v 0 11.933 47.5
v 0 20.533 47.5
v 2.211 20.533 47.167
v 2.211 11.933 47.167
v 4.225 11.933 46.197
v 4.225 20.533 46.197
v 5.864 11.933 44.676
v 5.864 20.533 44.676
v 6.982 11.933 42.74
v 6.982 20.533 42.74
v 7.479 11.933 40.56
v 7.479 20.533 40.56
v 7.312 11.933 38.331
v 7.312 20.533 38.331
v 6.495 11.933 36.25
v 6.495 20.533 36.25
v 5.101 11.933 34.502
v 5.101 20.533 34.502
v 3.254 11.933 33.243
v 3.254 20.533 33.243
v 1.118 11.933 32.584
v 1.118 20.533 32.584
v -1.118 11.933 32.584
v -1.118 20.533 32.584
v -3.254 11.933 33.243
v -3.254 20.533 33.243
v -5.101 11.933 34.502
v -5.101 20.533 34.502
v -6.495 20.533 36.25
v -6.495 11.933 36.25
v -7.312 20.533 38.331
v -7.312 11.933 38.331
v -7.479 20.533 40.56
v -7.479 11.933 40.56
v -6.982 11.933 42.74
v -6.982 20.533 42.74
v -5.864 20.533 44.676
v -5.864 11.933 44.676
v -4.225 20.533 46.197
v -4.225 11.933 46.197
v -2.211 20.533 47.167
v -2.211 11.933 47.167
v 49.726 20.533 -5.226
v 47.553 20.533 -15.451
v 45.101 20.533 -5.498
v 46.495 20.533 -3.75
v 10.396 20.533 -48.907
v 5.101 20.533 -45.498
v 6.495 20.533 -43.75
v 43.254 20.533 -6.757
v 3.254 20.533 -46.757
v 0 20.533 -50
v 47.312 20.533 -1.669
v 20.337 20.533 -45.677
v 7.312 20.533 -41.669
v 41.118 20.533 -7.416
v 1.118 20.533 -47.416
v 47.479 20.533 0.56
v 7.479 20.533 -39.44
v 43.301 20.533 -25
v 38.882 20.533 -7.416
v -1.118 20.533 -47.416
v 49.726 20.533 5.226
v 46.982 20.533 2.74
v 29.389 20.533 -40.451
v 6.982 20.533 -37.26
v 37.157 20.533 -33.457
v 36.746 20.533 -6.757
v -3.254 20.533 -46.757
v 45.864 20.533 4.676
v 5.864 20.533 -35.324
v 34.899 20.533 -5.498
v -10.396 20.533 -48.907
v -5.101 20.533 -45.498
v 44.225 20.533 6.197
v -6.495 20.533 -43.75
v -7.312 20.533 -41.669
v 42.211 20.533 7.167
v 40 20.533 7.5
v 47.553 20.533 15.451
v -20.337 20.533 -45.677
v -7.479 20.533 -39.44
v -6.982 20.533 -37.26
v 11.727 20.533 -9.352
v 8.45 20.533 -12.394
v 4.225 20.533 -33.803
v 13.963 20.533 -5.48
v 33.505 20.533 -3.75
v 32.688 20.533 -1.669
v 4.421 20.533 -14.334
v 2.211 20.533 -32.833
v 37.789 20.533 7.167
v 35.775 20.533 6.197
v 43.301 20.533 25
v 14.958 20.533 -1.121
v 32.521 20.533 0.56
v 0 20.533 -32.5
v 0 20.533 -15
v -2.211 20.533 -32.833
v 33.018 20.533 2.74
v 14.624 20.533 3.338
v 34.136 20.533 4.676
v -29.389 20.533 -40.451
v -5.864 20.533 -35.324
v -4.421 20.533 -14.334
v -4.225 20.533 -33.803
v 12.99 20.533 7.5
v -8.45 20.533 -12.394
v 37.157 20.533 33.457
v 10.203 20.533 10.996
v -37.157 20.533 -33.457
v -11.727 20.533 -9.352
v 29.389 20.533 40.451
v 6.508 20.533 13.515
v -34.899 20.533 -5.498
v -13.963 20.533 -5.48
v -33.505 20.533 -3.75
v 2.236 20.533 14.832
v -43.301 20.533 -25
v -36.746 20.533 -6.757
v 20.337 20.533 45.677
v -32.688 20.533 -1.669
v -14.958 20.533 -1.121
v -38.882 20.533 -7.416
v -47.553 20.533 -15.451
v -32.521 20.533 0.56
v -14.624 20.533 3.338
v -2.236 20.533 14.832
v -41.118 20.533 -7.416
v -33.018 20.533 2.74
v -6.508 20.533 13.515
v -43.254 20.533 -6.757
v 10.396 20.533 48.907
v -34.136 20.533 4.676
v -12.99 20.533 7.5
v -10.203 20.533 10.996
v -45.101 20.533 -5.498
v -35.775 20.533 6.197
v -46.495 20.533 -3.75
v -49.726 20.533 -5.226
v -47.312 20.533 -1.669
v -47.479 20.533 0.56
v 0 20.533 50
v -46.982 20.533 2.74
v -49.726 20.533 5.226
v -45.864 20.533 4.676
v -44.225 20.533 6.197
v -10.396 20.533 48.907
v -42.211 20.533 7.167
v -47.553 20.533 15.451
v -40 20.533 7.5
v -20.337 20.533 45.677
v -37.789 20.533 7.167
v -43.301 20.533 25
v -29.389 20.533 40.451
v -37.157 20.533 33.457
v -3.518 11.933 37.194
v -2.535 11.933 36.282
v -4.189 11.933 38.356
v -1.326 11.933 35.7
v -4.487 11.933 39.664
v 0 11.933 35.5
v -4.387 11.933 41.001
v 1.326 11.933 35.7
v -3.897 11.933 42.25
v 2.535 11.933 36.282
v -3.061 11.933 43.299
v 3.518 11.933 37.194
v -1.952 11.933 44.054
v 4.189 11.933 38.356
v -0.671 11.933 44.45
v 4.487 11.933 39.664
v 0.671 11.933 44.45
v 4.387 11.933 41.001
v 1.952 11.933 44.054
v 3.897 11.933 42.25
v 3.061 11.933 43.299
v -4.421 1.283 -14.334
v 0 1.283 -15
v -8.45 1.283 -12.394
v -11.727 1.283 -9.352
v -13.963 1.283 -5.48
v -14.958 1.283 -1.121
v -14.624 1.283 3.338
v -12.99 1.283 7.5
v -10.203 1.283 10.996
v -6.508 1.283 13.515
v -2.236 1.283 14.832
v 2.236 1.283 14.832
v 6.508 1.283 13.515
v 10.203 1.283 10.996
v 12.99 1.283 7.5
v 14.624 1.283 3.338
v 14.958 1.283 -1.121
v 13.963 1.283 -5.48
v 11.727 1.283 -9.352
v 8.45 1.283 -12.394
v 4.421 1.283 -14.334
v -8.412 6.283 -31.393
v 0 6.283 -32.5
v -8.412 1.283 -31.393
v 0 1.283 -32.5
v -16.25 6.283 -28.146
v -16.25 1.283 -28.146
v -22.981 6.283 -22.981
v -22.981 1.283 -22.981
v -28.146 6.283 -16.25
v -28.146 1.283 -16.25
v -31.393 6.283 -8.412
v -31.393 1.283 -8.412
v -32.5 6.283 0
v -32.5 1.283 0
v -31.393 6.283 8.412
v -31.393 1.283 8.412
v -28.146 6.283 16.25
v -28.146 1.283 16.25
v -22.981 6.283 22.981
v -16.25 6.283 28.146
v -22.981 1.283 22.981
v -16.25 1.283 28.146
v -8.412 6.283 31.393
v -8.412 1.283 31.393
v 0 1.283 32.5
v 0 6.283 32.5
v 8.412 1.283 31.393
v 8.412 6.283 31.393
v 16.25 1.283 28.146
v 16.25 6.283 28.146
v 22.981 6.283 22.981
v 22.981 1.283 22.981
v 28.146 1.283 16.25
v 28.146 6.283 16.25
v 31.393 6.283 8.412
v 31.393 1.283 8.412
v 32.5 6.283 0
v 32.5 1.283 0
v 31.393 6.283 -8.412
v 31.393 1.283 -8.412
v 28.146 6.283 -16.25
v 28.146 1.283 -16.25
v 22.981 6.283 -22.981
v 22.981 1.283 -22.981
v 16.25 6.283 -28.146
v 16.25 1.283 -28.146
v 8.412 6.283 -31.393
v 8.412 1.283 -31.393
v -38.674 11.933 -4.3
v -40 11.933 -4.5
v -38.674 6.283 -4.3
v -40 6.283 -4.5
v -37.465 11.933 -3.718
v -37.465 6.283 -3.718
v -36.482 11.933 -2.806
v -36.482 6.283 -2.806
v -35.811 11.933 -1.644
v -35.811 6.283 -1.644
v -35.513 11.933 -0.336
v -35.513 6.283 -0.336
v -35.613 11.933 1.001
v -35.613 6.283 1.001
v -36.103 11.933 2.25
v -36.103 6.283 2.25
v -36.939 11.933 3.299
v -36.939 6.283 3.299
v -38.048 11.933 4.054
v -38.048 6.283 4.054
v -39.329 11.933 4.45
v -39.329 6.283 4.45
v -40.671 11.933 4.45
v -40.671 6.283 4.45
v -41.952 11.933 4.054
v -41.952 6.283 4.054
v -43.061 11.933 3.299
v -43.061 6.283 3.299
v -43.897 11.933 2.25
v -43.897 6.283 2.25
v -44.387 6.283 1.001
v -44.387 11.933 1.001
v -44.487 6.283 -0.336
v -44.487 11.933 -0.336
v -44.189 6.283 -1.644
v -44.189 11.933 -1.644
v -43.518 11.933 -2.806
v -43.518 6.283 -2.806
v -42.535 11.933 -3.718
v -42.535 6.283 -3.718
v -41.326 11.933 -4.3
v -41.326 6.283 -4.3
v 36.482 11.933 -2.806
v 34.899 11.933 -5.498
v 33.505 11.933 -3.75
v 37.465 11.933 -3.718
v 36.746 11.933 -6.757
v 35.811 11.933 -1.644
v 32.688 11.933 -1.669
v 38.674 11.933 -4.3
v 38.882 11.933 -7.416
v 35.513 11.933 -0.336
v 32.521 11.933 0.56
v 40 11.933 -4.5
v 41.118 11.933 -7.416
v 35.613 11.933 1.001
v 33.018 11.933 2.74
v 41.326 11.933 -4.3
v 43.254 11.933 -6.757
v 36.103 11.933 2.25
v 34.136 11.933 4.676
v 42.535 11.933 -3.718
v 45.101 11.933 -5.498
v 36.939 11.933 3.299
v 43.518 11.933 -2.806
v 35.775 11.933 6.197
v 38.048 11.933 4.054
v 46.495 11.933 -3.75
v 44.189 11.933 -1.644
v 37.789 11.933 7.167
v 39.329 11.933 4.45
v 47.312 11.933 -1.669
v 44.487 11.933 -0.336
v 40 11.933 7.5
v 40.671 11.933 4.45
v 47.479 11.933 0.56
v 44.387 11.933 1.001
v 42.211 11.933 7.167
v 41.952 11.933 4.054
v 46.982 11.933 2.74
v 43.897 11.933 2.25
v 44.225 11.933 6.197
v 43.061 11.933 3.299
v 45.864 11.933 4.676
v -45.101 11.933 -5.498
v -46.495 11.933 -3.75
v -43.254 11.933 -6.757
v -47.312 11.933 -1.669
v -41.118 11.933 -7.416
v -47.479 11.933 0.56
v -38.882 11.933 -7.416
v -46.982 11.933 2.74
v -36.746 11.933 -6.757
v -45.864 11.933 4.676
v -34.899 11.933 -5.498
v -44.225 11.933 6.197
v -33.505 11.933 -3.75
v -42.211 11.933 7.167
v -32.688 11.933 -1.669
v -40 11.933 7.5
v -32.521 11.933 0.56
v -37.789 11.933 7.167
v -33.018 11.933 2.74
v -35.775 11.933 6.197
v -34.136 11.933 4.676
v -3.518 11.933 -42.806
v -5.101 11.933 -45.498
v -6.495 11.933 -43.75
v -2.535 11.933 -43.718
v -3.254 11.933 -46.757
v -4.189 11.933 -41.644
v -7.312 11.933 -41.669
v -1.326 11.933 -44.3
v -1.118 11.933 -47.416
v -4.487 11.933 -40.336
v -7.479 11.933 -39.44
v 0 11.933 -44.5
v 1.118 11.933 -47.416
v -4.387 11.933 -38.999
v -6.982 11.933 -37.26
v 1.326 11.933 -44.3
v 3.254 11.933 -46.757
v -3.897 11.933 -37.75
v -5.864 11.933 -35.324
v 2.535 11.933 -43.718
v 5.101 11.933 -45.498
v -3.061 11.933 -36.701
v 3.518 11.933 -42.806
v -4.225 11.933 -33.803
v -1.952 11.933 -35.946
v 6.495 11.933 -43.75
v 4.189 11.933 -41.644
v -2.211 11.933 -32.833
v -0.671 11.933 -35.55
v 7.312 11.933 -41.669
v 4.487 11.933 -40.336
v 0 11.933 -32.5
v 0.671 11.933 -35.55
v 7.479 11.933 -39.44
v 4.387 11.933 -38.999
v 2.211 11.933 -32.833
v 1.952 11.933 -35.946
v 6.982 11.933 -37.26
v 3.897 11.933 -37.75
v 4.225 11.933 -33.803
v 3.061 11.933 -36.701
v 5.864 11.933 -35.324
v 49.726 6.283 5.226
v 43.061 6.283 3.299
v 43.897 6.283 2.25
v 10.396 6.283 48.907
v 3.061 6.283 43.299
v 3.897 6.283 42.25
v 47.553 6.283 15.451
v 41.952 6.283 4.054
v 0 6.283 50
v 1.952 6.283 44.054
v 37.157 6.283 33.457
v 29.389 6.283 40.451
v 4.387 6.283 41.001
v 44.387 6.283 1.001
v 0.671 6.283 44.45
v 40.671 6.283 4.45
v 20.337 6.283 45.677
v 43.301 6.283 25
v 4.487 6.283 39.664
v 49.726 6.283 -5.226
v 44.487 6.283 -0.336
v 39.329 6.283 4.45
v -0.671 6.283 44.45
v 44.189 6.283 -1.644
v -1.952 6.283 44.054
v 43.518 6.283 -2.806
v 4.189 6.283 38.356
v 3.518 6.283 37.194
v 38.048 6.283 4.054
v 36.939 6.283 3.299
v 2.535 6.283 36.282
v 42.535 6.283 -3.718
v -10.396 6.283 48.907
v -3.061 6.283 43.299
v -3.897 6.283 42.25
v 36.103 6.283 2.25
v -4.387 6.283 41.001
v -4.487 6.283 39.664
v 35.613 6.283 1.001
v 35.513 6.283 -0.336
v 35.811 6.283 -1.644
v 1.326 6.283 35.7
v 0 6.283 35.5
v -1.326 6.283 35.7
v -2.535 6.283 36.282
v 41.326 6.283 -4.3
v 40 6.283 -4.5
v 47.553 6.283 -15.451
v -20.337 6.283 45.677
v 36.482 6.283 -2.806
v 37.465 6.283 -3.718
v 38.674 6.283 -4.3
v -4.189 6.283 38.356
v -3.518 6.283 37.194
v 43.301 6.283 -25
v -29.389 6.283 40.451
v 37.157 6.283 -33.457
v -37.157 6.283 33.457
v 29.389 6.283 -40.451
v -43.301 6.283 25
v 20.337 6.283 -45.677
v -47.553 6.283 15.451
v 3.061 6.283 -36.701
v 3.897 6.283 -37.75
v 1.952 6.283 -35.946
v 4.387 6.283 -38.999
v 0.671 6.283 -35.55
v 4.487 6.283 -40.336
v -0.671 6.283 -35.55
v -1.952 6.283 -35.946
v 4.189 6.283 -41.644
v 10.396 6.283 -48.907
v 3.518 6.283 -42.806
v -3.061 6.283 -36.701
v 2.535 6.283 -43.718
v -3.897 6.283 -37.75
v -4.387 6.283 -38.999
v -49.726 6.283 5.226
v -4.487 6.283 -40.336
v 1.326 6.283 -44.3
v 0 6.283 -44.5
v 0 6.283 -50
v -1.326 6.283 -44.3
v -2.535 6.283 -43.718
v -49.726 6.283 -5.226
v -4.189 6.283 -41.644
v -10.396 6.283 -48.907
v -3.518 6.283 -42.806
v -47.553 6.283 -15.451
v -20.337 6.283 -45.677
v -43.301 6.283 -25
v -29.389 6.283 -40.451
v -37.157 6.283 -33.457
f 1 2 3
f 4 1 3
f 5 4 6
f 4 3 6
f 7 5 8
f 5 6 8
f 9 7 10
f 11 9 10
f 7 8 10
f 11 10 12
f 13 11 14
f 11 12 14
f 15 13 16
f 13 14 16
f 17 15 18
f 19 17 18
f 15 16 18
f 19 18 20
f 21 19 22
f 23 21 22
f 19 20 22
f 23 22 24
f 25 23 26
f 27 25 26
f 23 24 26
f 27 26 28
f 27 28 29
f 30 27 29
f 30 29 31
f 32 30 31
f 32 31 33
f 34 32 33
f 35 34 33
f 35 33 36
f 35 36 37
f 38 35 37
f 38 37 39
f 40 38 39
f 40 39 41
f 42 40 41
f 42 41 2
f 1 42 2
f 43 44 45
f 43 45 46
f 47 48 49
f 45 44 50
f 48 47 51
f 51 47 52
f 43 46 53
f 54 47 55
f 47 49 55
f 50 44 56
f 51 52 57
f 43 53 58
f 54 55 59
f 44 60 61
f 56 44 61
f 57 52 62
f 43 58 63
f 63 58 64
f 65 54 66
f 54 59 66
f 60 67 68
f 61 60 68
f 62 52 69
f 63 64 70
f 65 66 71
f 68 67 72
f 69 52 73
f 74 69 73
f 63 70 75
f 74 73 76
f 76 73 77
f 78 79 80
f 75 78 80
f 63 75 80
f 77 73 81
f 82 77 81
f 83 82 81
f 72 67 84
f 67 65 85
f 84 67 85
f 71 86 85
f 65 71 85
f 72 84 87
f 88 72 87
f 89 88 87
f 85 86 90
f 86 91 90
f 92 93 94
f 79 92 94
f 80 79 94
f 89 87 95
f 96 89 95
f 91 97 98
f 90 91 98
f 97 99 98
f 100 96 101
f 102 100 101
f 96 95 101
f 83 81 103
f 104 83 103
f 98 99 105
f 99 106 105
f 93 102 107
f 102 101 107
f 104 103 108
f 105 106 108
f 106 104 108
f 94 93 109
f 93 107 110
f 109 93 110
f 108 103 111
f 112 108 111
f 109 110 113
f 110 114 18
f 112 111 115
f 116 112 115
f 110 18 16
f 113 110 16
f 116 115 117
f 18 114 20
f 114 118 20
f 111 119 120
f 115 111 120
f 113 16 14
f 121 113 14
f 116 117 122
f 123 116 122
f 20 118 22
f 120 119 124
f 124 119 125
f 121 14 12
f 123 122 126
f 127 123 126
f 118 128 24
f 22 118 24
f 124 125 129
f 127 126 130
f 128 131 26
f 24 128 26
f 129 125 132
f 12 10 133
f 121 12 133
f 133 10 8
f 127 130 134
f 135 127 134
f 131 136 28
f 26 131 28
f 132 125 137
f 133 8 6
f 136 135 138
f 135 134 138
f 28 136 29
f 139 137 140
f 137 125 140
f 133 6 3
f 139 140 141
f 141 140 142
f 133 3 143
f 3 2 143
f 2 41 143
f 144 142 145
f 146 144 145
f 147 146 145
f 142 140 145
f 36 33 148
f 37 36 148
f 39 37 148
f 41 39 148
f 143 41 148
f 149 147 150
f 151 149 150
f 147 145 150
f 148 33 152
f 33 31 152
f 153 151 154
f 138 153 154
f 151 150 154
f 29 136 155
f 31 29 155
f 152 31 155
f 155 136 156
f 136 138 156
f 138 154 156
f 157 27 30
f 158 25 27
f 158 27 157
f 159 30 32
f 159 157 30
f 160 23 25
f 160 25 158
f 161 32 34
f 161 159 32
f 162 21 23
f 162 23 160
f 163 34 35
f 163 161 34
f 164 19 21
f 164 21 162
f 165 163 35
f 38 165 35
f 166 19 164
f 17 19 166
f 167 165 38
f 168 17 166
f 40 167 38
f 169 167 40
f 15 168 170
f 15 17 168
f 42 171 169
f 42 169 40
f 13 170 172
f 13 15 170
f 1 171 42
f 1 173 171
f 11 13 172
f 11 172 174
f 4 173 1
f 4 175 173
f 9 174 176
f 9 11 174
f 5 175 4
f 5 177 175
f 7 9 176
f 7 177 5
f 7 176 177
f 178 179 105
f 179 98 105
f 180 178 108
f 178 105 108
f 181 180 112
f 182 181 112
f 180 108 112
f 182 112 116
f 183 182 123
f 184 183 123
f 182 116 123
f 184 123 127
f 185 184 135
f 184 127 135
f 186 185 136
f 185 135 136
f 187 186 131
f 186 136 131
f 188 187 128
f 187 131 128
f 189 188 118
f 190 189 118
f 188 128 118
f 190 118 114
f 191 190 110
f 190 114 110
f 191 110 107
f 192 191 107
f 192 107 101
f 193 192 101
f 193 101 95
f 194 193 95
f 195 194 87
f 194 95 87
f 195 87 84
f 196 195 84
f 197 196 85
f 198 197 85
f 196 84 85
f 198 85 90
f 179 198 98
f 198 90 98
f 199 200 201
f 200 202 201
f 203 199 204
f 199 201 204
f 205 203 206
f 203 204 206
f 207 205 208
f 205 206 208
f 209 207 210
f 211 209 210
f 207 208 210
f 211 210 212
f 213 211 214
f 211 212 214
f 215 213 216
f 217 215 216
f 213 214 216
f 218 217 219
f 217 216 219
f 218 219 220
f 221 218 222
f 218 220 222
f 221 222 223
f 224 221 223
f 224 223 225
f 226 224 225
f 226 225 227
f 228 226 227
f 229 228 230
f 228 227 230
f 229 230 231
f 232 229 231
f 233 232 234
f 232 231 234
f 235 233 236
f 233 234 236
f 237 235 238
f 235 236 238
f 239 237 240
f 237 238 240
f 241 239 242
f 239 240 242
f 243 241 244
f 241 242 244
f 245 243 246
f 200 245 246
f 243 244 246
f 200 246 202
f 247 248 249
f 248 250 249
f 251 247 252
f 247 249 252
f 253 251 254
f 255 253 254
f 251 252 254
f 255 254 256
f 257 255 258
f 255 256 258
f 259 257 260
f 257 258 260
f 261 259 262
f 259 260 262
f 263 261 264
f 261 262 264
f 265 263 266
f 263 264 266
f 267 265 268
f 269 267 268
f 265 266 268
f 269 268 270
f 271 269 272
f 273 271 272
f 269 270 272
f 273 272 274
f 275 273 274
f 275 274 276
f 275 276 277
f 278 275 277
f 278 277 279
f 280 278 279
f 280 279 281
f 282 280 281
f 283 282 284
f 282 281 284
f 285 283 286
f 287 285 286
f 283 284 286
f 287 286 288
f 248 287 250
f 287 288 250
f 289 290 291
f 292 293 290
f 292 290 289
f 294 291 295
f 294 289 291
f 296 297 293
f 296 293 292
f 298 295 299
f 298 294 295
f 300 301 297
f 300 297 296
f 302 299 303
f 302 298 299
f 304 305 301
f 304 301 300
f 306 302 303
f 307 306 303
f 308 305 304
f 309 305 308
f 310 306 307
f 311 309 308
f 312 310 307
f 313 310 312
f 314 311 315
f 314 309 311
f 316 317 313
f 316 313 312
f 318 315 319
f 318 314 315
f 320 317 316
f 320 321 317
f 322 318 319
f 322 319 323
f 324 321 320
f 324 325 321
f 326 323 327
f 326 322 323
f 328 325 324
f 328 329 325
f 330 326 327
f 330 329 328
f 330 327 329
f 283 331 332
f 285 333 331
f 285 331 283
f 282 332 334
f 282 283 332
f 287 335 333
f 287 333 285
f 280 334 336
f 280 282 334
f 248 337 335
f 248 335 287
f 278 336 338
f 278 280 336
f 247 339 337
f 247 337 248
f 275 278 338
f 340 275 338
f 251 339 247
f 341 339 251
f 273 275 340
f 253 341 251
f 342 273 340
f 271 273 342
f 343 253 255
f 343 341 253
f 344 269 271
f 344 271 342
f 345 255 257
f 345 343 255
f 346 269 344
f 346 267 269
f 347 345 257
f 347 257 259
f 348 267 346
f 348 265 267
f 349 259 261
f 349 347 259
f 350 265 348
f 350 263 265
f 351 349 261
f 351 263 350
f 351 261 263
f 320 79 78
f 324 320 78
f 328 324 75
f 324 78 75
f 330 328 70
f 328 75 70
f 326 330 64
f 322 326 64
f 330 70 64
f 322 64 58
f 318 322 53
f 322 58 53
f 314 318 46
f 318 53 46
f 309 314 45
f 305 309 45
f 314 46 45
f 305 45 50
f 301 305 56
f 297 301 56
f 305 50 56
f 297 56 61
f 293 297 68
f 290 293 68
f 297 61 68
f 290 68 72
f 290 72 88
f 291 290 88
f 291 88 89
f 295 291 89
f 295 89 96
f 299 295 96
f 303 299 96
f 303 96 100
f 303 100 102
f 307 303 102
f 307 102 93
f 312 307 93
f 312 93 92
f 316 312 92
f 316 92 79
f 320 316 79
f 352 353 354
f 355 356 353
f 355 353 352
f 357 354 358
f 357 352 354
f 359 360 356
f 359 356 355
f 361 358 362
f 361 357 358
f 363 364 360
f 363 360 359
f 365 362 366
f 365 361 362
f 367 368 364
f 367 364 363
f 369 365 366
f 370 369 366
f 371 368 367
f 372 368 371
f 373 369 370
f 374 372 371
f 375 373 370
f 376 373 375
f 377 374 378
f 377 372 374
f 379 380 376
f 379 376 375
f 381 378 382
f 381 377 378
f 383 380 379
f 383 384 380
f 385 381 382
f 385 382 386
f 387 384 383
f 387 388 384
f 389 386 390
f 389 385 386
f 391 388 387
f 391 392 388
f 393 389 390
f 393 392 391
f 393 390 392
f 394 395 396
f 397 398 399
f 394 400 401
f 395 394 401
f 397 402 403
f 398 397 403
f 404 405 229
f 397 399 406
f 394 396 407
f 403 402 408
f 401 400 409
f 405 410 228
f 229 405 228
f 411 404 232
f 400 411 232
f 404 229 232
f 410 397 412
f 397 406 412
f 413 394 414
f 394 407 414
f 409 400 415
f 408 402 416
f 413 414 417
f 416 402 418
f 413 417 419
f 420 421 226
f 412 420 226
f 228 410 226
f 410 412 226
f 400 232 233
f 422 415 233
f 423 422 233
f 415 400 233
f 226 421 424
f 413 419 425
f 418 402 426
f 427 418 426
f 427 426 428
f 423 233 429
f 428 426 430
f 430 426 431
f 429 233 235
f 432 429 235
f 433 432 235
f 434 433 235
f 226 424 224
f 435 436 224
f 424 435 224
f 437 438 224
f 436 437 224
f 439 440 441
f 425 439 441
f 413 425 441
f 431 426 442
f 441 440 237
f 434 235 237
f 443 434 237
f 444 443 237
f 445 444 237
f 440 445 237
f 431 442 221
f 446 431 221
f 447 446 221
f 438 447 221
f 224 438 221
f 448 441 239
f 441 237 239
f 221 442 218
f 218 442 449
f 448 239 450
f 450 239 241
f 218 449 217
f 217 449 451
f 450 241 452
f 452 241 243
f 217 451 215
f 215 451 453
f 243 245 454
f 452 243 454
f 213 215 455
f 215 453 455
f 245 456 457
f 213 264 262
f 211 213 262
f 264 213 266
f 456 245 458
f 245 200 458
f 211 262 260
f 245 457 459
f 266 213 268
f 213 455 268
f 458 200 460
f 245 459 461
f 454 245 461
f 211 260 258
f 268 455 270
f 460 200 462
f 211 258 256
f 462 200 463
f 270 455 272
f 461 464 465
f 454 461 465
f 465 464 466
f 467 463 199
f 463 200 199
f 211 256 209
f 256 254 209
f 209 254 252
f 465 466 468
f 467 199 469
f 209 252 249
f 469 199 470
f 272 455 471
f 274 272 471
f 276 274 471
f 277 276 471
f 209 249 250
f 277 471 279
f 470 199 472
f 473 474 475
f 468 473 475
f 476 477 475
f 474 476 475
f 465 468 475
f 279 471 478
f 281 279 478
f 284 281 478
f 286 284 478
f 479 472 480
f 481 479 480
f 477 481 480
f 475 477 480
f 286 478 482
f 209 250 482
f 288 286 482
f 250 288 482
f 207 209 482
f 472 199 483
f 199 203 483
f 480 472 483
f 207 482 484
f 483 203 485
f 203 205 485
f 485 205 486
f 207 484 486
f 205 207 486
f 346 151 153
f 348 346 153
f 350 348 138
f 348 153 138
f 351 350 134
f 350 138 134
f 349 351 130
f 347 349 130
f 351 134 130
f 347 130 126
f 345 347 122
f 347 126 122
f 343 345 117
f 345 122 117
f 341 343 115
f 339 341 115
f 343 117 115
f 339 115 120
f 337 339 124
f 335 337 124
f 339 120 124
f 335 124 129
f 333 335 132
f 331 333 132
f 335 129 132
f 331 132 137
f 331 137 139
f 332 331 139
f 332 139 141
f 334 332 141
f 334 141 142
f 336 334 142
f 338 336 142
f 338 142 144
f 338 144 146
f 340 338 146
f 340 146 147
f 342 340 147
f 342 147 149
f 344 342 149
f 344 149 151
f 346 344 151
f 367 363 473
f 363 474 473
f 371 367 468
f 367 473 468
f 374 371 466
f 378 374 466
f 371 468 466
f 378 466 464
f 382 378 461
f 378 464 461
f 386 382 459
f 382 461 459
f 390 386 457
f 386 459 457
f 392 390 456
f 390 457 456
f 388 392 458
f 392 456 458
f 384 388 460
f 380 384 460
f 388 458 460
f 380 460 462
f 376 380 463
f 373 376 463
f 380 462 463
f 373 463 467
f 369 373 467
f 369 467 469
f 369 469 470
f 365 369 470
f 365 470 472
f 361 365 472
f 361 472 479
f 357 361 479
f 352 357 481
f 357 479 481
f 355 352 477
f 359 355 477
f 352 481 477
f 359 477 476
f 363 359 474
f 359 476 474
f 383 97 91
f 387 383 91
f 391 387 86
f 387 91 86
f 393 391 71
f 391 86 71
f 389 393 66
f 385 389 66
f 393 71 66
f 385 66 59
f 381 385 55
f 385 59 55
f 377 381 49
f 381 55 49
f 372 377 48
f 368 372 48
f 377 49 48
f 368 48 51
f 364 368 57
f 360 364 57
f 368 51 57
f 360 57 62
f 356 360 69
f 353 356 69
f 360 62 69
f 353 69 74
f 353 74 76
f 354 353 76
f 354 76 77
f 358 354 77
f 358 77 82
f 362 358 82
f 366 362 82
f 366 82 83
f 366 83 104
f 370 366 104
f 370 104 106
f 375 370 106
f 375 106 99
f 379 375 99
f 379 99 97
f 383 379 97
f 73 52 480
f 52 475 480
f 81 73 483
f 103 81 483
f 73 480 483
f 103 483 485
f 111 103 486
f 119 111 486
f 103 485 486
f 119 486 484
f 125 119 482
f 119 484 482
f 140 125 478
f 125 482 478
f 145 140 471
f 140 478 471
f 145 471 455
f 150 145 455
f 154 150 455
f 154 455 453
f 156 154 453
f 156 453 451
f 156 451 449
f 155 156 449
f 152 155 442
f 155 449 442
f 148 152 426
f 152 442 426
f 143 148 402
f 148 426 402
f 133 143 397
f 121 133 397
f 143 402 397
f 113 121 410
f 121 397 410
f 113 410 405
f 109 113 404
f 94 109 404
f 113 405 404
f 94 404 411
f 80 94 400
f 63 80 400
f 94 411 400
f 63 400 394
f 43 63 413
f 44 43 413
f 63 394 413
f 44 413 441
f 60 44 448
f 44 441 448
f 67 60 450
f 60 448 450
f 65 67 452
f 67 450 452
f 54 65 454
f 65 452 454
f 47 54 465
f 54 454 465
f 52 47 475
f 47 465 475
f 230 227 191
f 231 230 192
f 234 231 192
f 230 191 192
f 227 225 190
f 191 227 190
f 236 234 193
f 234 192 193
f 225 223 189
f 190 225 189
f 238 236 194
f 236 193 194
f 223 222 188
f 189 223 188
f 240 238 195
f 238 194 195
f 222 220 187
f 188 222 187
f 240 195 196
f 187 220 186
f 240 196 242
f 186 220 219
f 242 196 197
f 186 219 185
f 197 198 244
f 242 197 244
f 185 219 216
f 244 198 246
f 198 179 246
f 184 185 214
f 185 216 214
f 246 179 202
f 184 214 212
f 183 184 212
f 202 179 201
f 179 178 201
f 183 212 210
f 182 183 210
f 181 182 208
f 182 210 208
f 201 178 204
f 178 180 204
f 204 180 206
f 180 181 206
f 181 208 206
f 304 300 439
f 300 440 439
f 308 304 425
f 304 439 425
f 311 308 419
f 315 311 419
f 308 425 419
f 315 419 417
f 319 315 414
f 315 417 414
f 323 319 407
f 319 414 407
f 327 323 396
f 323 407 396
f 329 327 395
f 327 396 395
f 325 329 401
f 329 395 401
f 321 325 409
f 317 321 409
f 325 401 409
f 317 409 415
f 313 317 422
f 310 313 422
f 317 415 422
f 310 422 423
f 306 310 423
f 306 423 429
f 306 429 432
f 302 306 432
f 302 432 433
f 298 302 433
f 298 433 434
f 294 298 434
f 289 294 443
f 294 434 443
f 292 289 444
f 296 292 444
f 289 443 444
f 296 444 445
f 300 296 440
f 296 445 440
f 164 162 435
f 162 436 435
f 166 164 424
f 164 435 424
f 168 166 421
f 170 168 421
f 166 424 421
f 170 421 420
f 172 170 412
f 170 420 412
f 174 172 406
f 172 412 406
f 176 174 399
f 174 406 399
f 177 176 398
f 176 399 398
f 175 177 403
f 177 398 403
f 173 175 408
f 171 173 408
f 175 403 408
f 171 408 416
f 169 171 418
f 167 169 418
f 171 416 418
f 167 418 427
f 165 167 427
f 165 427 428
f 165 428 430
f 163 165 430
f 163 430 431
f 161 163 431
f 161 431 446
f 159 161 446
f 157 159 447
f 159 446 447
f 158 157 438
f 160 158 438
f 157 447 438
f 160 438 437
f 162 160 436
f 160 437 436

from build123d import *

# Parameters (mm, degrees)
POG_BIENIE_WALCOWE_POD_M8_WKR_T_Z_BEM_W_D           = 9
POG_BIENIE_WALCOWE_POD_M8_WKR_T_Z_BEM_W_DEPTH       = 42
POG_BIENIE_WALCOWE_POD_M8_WKR_T_Z_BEM_W_CBORE_D     = 15
POG_BIENIE_WALCOWE_POD_M8_WKR_T_Z_BEM_W_CBORE_DEPTH = 8.6
POG_BIENIE_WALCOWE_POD_M8_WKR_T_Z_BEM_W_TIP         = 2.703872786


with BuildPart() as part:
    # Szkic1 → Obrót1 (revolve)
    with BuildSketch(Plane.XY, mode=Mode.PRIVATE) as obr_t1_sk:
        Polygon((-15, 20.532632774), (-50, 20.532632774), (-50, 6.282632774), (-32.5, 6.282632774), (-32.5, 1.282632774), (-15, 1.282632774), align=None)
    revolve(obr_t1_sk.sketch.rotate(Axis((0, 0, 0), (0, 1, 0)), 270), axis=Axis((0, 0, 0), (0, 1, 0)))

    # Pogłębienie walcowe pod M8 Wkręt z łbem walcowym z gniazdem sześciokątnym1
    with Locations(Plane(origin=(-40, 20.532632774, 0), x_dir=(0, 0, 1), z_dir=(0, 1, 0))):
        with Locations((0, 0), (-40, 40), (0, 80), (40, 40)):
            CounterBoreHole(POG_BIENIE_WALCOWE_POD_M8_WKR_T_Z_BEM_W_D / 2, POG_BIENIE_WALCOWE_POD_M8_WKR_T_Z_BEM_W_CBORE_D / 2, POG_BIENIE_WALCOWE_POD_M8_WKR_T_Z_BEM_W_CBORE_DEPTH, depth=POG_BIENIE_WALCOWE_POD_M8_WKR_T_Z_BEM_W_DEPTH)
            with Locations((0, 0, -(POG_BIENIE_WALCOWE_POD_M8_WKR_T_Z_BEM_W_DEPTH + POG_BIENIE_WALCOWE_POD_M8_WKR_T_Z_BEM_W_TIP / 2))):  # 118° drill point
                Cone(0, POG_BIENIE_WALCOWE_POD_M8_WKR_T_Z_BEM_W_D / 2, POG_BIENIE_WALCOWE_POD_M8_WKR_T_Z_BEM_W_TIP, mode=Mode.SUBTRACT)


solid = part.part
